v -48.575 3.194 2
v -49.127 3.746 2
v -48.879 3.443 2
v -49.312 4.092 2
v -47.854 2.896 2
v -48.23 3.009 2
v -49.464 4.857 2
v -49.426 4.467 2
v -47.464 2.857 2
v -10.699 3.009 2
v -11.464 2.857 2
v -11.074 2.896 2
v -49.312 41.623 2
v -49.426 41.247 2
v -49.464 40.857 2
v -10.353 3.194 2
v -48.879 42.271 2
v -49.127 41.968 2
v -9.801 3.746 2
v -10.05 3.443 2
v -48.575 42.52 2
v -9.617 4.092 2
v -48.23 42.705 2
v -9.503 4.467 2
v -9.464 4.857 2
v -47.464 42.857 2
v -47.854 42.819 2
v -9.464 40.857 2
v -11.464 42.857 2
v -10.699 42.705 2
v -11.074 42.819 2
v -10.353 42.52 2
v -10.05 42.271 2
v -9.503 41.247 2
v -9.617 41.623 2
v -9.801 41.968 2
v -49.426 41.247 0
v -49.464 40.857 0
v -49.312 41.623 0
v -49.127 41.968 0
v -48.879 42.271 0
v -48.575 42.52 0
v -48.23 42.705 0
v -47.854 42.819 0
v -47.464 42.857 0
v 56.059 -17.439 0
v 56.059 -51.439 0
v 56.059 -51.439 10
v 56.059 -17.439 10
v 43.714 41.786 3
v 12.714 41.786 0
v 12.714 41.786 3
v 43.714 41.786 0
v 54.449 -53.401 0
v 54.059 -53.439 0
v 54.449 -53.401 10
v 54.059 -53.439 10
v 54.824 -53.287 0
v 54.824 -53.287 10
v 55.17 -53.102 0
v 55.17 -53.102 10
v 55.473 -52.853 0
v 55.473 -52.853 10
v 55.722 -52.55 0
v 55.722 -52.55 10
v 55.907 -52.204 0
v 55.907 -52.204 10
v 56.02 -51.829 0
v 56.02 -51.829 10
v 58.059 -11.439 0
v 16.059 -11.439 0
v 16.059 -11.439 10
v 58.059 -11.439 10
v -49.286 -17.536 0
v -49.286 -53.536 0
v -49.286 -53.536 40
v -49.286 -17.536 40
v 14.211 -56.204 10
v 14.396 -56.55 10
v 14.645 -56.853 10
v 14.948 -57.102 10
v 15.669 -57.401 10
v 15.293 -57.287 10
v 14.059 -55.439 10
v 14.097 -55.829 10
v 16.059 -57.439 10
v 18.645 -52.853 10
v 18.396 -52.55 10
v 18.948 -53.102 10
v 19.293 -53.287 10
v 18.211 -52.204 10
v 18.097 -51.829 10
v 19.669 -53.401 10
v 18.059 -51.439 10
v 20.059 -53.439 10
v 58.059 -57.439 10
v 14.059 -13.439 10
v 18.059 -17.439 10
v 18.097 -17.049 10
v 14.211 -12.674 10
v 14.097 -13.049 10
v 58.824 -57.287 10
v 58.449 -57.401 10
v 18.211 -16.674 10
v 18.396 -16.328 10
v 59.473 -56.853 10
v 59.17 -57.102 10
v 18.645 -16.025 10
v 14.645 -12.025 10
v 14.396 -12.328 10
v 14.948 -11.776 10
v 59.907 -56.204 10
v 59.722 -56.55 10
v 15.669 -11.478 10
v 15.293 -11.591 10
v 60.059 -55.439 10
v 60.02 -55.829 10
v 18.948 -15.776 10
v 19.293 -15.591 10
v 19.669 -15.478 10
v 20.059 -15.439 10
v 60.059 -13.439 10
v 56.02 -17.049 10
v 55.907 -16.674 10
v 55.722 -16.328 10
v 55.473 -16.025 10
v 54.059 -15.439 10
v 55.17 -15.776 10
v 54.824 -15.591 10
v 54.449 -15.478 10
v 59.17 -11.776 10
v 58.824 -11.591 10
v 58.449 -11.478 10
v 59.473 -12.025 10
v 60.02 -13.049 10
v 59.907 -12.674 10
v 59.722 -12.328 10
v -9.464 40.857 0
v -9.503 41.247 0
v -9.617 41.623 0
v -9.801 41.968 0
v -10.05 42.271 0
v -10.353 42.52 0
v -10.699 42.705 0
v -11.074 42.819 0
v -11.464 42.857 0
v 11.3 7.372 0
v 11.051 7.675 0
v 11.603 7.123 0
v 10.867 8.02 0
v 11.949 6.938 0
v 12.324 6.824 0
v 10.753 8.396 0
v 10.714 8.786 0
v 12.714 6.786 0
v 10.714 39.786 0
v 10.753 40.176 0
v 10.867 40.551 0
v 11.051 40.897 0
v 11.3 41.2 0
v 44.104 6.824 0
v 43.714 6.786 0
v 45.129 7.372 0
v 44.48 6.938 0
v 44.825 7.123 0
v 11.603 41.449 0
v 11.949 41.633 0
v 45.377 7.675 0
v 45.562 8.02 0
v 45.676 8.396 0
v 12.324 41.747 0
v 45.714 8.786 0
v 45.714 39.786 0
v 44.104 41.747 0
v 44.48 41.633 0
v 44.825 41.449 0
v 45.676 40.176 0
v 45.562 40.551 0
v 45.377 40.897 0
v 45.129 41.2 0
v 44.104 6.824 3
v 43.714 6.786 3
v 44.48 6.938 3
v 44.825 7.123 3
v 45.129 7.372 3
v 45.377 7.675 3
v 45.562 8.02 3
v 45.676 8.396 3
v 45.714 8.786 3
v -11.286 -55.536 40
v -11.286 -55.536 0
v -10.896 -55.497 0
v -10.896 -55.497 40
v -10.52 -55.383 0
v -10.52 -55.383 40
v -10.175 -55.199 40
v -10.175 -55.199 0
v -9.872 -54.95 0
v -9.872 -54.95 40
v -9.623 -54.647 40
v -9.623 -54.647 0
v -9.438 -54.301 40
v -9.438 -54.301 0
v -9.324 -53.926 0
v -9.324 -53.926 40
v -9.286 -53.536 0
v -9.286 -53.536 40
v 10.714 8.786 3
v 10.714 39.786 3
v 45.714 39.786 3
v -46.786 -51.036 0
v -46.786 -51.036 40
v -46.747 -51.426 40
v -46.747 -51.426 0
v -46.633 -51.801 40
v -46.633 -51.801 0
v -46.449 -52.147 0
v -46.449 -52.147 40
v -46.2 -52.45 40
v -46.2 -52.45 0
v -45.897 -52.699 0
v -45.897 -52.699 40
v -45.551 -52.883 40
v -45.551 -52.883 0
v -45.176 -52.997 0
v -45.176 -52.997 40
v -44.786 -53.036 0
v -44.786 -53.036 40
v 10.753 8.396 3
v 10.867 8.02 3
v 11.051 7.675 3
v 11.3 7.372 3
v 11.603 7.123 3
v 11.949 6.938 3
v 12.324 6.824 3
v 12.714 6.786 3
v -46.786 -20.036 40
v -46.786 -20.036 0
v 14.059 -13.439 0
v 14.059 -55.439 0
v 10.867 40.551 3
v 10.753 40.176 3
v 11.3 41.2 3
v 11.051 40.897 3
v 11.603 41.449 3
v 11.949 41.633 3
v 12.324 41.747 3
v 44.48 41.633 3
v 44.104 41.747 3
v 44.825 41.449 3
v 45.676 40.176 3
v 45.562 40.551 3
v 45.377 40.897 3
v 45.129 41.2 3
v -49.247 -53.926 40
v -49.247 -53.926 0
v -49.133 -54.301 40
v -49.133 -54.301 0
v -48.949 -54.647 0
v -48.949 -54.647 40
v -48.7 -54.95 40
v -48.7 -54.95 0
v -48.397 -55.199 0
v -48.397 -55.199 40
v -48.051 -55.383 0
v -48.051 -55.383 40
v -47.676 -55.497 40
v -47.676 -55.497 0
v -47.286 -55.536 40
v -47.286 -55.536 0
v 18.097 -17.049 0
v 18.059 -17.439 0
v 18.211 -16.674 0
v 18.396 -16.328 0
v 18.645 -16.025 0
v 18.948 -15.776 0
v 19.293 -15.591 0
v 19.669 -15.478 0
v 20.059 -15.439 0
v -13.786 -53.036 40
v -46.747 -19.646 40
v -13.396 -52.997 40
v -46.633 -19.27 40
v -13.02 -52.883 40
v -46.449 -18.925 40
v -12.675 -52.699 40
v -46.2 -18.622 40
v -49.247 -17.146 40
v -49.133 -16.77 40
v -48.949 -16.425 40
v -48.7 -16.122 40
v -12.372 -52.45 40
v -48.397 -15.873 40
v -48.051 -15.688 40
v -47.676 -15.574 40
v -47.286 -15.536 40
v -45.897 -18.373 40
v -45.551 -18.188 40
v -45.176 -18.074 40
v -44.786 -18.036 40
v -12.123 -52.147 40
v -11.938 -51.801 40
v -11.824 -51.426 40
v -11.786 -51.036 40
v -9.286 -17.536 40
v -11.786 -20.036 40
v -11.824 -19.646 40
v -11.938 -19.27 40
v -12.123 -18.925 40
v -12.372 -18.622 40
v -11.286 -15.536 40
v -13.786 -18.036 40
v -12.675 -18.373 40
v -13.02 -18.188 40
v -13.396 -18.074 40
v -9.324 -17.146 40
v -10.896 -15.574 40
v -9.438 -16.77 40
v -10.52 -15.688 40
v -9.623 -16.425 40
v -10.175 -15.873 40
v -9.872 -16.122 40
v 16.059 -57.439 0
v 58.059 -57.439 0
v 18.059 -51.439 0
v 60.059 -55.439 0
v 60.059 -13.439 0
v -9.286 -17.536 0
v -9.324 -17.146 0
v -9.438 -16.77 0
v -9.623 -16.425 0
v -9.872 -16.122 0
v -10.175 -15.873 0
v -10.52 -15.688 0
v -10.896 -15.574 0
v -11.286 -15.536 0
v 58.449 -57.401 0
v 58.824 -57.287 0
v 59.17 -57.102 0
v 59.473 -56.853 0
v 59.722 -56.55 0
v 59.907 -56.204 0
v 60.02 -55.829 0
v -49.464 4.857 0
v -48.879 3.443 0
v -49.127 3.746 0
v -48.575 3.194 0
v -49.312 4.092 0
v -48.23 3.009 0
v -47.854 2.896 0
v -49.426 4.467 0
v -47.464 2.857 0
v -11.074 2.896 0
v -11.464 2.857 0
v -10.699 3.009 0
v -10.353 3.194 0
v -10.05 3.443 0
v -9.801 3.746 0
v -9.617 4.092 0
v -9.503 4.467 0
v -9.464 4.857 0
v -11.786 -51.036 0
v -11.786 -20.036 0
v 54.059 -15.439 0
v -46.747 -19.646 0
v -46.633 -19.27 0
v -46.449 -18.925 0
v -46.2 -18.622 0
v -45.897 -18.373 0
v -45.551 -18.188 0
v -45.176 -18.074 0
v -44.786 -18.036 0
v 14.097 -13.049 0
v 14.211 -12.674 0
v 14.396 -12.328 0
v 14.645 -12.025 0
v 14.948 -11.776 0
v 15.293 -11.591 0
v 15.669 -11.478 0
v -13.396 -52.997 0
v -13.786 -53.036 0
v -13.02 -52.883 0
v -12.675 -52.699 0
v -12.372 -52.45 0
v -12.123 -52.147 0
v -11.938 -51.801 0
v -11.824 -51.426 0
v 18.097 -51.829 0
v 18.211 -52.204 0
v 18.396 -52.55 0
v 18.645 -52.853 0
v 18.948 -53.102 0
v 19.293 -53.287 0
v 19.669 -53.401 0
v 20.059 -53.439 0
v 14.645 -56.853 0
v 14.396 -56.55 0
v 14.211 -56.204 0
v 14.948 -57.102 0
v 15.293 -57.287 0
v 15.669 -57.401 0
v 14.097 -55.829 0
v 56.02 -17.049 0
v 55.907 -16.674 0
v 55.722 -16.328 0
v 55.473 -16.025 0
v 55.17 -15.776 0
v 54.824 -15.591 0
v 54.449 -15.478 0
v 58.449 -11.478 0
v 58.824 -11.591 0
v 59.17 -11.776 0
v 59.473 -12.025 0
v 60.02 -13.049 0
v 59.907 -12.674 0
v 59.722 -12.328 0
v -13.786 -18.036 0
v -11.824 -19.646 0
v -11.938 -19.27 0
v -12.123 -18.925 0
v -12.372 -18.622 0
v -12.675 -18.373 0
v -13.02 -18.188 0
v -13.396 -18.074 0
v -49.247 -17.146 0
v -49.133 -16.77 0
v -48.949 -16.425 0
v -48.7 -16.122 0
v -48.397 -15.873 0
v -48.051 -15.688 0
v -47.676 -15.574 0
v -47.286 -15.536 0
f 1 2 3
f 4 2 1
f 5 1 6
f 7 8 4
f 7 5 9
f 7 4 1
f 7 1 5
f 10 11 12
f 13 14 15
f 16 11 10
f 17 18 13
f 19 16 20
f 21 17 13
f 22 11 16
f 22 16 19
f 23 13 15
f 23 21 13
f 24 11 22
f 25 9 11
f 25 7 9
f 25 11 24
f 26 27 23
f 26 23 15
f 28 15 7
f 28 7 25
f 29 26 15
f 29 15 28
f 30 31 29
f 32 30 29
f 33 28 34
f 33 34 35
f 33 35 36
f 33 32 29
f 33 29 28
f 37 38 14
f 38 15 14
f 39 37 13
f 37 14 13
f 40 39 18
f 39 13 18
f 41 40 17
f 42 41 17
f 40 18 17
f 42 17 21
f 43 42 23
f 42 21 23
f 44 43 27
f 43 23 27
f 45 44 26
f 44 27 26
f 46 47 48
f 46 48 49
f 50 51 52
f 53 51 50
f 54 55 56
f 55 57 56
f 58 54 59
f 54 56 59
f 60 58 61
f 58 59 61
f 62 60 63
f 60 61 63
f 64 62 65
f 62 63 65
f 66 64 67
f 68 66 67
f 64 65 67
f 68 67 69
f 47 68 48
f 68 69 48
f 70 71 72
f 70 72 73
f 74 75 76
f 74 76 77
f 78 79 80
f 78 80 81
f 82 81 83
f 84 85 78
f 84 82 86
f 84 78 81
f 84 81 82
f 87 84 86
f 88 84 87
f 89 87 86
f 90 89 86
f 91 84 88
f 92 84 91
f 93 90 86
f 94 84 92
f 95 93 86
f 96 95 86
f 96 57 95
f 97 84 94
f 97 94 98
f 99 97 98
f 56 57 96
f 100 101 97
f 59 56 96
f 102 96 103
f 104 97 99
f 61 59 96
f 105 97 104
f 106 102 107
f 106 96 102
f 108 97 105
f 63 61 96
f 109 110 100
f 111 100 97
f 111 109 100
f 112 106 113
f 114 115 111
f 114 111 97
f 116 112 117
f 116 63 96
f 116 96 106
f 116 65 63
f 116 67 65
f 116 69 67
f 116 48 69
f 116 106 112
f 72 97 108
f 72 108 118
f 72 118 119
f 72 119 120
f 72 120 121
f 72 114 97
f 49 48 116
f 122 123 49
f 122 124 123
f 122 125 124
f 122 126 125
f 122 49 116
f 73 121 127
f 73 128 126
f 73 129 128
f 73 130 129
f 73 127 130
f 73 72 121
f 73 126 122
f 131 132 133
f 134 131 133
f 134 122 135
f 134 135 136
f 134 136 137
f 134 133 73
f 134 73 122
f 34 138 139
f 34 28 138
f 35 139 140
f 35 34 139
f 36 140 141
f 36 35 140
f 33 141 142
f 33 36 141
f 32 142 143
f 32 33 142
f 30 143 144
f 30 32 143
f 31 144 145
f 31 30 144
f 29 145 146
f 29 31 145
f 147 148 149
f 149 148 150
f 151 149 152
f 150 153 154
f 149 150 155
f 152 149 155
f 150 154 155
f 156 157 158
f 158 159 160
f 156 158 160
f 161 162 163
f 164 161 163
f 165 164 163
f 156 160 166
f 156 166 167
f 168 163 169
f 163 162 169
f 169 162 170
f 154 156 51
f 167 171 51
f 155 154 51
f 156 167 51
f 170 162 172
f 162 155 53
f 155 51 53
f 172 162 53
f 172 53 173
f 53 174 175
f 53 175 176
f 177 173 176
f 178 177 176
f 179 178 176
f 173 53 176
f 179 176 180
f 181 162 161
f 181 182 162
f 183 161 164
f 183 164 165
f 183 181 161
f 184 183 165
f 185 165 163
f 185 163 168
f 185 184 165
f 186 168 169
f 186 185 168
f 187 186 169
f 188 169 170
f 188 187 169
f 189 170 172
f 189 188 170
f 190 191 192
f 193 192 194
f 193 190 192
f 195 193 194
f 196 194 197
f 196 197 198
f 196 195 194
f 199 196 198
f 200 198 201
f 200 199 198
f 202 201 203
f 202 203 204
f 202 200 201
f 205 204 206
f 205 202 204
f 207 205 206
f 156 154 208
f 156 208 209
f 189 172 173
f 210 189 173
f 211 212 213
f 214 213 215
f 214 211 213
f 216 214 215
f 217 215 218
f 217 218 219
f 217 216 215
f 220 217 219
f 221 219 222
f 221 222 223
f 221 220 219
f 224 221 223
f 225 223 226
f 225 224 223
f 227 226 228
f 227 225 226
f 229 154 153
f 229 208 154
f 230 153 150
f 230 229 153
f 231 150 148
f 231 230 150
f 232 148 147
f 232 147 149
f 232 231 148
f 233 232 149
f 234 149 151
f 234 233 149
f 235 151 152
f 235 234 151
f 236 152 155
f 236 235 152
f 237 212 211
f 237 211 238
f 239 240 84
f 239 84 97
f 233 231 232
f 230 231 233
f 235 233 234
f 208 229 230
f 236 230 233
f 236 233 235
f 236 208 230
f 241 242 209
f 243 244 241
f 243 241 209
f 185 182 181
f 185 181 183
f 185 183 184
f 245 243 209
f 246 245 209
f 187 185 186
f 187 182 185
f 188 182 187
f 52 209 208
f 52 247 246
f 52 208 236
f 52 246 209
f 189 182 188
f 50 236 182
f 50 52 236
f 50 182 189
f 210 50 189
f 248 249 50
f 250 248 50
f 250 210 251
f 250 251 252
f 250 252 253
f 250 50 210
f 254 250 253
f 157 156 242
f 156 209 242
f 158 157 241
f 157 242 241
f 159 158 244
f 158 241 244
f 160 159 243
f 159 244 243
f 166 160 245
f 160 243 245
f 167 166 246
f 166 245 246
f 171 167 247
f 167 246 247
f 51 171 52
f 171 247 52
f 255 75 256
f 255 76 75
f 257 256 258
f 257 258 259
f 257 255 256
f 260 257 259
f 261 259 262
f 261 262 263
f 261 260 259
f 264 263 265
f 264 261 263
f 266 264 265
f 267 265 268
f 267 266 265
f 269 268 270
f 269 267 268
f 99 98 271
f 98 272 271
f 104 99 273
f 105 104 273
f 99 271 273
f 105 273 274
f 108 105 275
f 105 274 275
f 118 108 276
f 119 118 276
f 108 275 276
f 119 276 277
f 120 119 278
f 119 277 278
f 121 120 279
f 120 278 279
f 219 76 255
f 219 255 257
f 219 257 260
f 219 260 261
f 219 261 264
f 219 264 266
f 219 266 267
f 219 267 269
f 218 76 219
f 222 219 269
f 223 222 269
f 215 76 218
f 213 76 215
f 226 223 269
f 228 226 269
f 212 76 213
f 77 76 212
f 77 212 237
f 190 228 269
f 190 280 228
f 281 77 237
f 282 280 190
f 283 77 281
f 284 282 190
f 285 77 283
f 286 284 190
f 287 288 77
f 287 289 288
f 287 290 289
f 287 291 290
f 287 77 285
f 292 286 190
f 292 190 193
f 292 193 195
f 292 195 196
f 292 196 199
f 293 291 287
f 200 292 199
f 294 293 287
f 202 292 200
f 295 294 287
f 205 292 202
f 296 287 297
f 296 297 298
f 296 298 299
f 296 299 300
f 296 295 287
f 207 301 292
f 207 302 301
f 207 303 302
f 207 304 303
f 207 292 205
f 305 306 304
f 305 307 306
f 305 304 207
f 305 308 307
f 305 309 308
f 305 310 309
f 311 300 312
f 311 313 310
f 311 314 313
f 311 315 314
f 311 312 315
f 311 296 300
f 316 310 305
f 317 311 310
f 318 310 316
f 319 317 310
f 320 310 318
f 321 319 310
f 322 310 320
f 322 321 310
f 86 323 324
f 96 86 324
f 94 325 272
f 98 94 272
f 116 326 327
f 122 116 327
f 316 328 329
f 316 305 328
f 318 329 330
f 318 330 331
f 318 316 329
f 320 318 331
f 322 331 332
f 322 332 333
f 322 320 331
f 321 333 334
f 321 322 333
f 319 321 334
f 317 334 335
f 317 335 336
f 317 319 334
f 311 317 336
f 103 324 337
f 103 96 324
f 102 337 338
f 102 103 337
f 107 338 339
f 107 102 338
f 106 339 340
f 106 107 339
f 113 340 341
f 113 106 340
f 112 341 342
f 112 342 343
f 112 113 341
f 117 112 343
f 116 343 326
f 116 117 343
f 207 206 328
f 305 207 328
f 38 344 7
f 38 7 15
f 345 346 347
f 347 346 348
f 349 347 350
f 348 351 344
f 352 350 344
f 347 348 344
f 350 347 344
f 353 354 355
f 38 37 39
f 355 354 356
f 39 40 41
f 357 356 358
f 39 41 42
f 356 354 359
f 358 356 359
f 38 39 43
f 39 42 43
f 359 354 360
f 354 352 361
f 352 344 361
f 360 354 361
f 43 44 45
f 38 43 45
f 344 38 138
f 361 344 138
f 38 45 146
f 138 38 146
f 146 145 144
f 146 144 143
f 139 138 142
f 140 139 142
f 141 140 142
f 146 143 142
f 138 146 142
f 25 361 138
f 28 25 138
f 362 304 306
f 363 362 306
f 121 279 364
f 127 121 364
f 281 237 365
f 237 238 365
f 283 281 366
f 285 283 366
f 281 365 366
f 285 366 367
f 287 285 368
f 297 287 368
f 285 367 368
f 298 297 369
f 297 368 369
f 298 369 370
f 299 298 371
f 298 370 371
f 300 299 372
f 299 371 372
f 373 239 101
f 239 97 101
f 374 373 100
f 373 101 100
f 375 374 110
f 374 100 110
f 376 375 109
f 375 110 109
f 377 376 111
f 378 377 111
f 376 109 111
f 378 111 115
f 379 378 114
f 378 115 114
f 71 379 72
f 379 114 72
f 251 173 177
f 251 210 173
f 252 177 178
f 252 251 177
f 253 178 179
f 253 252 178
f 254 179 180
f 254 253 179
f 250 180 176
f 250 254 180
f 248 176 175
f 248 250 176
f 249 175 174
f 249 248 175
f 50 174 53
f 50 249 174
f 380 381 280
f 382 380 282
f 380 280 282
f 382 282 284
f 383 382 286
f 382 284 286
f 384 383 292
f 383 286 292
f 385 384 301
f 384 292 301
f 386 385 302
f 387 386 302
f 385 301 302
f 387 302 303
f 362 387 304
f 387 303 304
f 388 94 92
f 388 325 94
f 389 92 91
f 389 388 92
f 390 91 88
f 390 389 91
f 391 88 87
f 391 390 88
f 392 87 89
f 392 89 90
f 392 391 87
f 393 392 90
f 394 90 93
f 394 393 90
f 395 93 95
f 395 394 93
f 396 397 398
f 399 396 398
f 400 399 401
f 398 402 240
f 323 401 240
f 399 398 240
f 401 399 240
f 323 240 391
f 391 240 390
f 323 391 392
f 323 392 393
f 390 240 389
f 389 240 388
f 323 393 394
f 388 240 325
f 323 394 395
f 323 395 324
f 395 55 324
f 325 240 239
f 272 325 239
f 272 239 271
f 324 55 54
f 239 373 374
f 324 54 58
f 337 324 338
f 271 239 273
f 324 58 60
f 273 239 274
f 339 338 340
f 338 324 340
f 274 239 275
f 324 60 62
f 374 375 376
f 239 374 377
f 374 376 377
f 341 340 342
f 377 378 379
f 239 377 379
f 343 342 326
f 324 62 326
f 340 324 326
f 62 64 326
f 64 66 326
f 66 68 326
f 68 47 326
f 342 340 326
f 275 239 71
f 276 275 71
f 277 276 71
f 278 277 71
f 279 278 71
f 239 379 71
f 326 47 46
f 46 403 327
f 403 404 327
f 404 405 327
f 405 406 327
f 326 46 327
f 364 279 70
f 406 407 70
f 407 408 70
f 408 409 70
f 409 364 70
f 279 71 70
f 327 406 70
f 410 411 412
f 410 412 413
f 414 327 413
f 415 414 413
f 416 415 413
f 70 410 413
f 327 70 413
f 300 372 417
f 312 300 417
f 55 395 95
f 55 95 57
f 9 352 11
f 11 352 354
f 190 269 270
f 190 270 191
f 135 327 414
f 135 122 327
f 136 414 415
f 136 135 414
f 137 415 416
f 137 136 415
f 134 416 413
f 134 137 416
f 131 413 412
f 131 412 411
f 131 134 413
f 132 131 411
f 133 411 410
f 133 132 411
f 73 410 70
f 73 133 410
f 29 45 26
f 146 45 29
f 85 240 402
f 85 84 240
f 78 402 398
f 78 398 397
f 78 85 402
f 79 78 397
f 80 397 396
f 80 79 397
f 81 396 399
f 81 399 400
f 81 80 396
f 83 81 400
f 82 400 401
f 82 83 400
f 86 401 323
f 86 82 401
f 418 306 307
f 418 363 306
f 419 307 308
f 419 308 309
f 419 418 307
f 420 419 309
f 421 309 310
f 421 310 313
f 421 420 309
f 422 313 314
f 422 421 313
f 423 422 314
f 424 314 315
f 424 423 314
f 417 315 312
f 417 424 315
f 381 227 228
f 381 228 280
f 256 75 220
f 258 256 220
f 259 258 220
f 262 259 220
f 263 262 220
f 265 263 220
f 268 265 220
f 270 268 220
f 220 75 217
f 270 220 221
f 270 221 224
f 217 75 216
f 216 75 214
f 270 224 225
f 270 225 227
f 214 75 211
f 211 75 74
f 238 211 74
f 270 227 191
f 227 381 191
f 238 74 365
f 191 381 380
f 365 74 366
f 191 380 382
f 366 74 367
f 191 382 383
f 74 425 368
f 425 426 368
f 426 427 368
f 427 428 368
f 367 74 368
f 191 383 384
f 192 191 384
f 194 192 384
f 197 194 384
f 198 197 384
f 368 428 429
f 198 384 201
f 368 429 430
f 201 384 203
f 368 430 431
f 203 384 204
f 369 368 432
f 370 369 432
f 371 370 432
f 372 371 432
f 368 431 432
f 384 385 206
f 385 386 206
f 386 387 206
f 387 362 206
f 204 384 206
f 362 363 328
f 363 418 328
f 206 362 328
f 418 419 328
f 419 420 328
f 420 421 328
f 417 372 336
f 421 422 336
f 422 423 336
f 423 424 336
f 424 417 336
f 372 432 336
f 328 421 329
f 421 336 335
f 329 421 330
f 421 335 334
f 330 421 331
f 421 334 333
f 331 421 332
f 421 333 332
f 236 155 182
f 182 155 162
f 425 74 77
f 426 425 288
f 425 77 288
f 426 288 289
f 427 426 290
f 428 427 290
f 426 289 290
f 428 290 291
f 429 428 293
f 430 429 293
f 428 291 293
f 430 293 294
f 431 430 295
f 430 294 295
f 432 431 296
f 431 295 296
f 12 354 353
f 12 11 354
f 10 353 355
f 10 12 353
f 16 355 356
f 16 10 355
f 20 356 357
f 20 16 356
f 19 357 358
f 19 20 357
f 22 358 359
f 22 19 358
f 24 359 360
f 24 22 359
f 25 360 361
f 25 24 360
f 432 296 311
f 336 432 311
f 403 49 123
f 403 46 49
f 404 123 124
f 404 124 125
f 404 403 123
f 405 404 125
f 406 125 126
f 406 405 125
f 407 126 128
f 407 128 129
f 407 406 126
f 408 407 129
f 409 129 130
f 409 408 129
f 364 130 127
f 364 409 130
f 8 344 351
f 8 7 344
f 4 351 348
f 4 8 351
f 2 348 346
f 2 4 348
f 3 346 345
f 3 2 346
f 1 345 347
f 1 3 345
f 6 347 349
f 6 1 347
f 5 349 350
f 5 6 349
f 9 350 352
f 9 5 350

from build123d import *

# Parameters (mm, degrees)
F0_W      = 40.0000037625
F0_H      = 40.0000046939
F1_DEPTH  = 2
F2_R      = 2
F3_W      = 35.0000020117
F3_H      = 34.999998752
F4_DEPTH  = 3
F5_R      = 2
F6_W      = 40.0000028312
F6_H      = 40.0000000373
F7_DEPTH  = 40
F8_T      = -2.5
F9_R      = 2
F10_W     = 46
F10_H     = 46
F11_DEPTH = 10
F12_T     = -4
F13_R     = 2


with BuildPart() as f1:
    # F0 (on Top) → F1 (new body)
    with BuildSketch(Plane.XY):
        with Locations((-29.4642872177, 22.8571454063)):
            Rectangle(F0_W, F0_H)
    extrude(amount=F1_DEPTH)

    # F2
    f2_edges = [f1.edges().sort_by_distance(p)[0] for p in [
        (-49.464289, 2.857143, 1),
        (-9.464285, 2.857143, 1),
        (-9.464285, 42.857148, 1),
        (-49.464289, 42.857148, 1),
    ]]
    fillet(f2_edges, radius=F2_R)


with BuildPart() as f4:
    # F3 (on Top) → F4 (new body)
    with BuildSketch(Plane.XY):
        with Locations((28.2142879441, 24.2857139092)):
            Rectangle(F3_W, F3_H)
    extrude(amount=F4_DEPTH)

    # F5
    f5_edges = [f4.edges().sort_by_distance(p)[0] for p in [
        (10.714287, 6.785715, 1.5),
        (45.714289, 6.785715, 1.5),
        (45.714289, 41.785713, 1.5),
        (10.714287, 41.785713, 1.5),
    ]]
    fillet(f5_edges, radius=F5_R)


with BuildPart() as f7:
    # F6 (on Top) → F7 (new body)
    with BuildSketch(Plane.XY):
        with Locations((-29.2857158929, -35.5357150547)):
            Rectangle(F6_W, F6_H)
    extrude(amount=F7_DEPTH)

    # F8
    f8_openings = [f7.faces().sort_by_distance(p)[0] for p in [
        (-29.285716, -35.535715, 40),
        (-29.285716, -35.535715, 0),
    ]]
    offset(amount=F8_T, openings=f8_openings)

    # F9
    f9_edges = [f7.edges().sort_by_distance(p)[0] for p in [
        (-9.285714, -55.535715, 20),
        (-9.285714, -15.535715, 20),
        (-49.285717, -15.535715, 20),
        (-49.285717, -55.535715, 20),
        (-11.785714, -53.035715, 20),
        (-11.785714, -18.035715, 20),
        (-46.785717, -18.035715, 20),
        (-46.785717, -53.035715, 20),
    ]]
    fillet(f9_edges, radius=F9_R)


with BuildPart() as f11:
    # F10 (on Top) → F11 (new body)
    with BuildSketch(Plane.XY):
        with Locations((37.0588265359, -34.4390756935)):
            Rectangle(F10_W, F10_H)
    extrude(amount=F11_DEPTH)

    # F12
    f12_openings = [f11.faces().sort_by_distance(p)[0] for p in [
        (37.058827, -34.439076, 10),
        (37.058827, -34.439076, 0),
    ]]
    offset(amount=F12_T, openings=f12_openings)

    # F13
    f13_edges = [f11.edges().sort_by_distance(p)[0] for p in [
        (60.058827, -11.439076, 5),
        (14.058827, -57.439076, 5),
        (14.058827, -11.439076, 5),
        (60.058827, -57.439076, 5),
        (18.058827, -53.439076, 5),
        (18.058827, -15.439076, 5),
        (56.058827, -53.439076, 5),
        (56.058827, -15.439076, 5),
    ]]
    fillet(f13_edges, radius=F13_R)


solid = Compound([f1.part, f4.part, f7.part, f11.part])
